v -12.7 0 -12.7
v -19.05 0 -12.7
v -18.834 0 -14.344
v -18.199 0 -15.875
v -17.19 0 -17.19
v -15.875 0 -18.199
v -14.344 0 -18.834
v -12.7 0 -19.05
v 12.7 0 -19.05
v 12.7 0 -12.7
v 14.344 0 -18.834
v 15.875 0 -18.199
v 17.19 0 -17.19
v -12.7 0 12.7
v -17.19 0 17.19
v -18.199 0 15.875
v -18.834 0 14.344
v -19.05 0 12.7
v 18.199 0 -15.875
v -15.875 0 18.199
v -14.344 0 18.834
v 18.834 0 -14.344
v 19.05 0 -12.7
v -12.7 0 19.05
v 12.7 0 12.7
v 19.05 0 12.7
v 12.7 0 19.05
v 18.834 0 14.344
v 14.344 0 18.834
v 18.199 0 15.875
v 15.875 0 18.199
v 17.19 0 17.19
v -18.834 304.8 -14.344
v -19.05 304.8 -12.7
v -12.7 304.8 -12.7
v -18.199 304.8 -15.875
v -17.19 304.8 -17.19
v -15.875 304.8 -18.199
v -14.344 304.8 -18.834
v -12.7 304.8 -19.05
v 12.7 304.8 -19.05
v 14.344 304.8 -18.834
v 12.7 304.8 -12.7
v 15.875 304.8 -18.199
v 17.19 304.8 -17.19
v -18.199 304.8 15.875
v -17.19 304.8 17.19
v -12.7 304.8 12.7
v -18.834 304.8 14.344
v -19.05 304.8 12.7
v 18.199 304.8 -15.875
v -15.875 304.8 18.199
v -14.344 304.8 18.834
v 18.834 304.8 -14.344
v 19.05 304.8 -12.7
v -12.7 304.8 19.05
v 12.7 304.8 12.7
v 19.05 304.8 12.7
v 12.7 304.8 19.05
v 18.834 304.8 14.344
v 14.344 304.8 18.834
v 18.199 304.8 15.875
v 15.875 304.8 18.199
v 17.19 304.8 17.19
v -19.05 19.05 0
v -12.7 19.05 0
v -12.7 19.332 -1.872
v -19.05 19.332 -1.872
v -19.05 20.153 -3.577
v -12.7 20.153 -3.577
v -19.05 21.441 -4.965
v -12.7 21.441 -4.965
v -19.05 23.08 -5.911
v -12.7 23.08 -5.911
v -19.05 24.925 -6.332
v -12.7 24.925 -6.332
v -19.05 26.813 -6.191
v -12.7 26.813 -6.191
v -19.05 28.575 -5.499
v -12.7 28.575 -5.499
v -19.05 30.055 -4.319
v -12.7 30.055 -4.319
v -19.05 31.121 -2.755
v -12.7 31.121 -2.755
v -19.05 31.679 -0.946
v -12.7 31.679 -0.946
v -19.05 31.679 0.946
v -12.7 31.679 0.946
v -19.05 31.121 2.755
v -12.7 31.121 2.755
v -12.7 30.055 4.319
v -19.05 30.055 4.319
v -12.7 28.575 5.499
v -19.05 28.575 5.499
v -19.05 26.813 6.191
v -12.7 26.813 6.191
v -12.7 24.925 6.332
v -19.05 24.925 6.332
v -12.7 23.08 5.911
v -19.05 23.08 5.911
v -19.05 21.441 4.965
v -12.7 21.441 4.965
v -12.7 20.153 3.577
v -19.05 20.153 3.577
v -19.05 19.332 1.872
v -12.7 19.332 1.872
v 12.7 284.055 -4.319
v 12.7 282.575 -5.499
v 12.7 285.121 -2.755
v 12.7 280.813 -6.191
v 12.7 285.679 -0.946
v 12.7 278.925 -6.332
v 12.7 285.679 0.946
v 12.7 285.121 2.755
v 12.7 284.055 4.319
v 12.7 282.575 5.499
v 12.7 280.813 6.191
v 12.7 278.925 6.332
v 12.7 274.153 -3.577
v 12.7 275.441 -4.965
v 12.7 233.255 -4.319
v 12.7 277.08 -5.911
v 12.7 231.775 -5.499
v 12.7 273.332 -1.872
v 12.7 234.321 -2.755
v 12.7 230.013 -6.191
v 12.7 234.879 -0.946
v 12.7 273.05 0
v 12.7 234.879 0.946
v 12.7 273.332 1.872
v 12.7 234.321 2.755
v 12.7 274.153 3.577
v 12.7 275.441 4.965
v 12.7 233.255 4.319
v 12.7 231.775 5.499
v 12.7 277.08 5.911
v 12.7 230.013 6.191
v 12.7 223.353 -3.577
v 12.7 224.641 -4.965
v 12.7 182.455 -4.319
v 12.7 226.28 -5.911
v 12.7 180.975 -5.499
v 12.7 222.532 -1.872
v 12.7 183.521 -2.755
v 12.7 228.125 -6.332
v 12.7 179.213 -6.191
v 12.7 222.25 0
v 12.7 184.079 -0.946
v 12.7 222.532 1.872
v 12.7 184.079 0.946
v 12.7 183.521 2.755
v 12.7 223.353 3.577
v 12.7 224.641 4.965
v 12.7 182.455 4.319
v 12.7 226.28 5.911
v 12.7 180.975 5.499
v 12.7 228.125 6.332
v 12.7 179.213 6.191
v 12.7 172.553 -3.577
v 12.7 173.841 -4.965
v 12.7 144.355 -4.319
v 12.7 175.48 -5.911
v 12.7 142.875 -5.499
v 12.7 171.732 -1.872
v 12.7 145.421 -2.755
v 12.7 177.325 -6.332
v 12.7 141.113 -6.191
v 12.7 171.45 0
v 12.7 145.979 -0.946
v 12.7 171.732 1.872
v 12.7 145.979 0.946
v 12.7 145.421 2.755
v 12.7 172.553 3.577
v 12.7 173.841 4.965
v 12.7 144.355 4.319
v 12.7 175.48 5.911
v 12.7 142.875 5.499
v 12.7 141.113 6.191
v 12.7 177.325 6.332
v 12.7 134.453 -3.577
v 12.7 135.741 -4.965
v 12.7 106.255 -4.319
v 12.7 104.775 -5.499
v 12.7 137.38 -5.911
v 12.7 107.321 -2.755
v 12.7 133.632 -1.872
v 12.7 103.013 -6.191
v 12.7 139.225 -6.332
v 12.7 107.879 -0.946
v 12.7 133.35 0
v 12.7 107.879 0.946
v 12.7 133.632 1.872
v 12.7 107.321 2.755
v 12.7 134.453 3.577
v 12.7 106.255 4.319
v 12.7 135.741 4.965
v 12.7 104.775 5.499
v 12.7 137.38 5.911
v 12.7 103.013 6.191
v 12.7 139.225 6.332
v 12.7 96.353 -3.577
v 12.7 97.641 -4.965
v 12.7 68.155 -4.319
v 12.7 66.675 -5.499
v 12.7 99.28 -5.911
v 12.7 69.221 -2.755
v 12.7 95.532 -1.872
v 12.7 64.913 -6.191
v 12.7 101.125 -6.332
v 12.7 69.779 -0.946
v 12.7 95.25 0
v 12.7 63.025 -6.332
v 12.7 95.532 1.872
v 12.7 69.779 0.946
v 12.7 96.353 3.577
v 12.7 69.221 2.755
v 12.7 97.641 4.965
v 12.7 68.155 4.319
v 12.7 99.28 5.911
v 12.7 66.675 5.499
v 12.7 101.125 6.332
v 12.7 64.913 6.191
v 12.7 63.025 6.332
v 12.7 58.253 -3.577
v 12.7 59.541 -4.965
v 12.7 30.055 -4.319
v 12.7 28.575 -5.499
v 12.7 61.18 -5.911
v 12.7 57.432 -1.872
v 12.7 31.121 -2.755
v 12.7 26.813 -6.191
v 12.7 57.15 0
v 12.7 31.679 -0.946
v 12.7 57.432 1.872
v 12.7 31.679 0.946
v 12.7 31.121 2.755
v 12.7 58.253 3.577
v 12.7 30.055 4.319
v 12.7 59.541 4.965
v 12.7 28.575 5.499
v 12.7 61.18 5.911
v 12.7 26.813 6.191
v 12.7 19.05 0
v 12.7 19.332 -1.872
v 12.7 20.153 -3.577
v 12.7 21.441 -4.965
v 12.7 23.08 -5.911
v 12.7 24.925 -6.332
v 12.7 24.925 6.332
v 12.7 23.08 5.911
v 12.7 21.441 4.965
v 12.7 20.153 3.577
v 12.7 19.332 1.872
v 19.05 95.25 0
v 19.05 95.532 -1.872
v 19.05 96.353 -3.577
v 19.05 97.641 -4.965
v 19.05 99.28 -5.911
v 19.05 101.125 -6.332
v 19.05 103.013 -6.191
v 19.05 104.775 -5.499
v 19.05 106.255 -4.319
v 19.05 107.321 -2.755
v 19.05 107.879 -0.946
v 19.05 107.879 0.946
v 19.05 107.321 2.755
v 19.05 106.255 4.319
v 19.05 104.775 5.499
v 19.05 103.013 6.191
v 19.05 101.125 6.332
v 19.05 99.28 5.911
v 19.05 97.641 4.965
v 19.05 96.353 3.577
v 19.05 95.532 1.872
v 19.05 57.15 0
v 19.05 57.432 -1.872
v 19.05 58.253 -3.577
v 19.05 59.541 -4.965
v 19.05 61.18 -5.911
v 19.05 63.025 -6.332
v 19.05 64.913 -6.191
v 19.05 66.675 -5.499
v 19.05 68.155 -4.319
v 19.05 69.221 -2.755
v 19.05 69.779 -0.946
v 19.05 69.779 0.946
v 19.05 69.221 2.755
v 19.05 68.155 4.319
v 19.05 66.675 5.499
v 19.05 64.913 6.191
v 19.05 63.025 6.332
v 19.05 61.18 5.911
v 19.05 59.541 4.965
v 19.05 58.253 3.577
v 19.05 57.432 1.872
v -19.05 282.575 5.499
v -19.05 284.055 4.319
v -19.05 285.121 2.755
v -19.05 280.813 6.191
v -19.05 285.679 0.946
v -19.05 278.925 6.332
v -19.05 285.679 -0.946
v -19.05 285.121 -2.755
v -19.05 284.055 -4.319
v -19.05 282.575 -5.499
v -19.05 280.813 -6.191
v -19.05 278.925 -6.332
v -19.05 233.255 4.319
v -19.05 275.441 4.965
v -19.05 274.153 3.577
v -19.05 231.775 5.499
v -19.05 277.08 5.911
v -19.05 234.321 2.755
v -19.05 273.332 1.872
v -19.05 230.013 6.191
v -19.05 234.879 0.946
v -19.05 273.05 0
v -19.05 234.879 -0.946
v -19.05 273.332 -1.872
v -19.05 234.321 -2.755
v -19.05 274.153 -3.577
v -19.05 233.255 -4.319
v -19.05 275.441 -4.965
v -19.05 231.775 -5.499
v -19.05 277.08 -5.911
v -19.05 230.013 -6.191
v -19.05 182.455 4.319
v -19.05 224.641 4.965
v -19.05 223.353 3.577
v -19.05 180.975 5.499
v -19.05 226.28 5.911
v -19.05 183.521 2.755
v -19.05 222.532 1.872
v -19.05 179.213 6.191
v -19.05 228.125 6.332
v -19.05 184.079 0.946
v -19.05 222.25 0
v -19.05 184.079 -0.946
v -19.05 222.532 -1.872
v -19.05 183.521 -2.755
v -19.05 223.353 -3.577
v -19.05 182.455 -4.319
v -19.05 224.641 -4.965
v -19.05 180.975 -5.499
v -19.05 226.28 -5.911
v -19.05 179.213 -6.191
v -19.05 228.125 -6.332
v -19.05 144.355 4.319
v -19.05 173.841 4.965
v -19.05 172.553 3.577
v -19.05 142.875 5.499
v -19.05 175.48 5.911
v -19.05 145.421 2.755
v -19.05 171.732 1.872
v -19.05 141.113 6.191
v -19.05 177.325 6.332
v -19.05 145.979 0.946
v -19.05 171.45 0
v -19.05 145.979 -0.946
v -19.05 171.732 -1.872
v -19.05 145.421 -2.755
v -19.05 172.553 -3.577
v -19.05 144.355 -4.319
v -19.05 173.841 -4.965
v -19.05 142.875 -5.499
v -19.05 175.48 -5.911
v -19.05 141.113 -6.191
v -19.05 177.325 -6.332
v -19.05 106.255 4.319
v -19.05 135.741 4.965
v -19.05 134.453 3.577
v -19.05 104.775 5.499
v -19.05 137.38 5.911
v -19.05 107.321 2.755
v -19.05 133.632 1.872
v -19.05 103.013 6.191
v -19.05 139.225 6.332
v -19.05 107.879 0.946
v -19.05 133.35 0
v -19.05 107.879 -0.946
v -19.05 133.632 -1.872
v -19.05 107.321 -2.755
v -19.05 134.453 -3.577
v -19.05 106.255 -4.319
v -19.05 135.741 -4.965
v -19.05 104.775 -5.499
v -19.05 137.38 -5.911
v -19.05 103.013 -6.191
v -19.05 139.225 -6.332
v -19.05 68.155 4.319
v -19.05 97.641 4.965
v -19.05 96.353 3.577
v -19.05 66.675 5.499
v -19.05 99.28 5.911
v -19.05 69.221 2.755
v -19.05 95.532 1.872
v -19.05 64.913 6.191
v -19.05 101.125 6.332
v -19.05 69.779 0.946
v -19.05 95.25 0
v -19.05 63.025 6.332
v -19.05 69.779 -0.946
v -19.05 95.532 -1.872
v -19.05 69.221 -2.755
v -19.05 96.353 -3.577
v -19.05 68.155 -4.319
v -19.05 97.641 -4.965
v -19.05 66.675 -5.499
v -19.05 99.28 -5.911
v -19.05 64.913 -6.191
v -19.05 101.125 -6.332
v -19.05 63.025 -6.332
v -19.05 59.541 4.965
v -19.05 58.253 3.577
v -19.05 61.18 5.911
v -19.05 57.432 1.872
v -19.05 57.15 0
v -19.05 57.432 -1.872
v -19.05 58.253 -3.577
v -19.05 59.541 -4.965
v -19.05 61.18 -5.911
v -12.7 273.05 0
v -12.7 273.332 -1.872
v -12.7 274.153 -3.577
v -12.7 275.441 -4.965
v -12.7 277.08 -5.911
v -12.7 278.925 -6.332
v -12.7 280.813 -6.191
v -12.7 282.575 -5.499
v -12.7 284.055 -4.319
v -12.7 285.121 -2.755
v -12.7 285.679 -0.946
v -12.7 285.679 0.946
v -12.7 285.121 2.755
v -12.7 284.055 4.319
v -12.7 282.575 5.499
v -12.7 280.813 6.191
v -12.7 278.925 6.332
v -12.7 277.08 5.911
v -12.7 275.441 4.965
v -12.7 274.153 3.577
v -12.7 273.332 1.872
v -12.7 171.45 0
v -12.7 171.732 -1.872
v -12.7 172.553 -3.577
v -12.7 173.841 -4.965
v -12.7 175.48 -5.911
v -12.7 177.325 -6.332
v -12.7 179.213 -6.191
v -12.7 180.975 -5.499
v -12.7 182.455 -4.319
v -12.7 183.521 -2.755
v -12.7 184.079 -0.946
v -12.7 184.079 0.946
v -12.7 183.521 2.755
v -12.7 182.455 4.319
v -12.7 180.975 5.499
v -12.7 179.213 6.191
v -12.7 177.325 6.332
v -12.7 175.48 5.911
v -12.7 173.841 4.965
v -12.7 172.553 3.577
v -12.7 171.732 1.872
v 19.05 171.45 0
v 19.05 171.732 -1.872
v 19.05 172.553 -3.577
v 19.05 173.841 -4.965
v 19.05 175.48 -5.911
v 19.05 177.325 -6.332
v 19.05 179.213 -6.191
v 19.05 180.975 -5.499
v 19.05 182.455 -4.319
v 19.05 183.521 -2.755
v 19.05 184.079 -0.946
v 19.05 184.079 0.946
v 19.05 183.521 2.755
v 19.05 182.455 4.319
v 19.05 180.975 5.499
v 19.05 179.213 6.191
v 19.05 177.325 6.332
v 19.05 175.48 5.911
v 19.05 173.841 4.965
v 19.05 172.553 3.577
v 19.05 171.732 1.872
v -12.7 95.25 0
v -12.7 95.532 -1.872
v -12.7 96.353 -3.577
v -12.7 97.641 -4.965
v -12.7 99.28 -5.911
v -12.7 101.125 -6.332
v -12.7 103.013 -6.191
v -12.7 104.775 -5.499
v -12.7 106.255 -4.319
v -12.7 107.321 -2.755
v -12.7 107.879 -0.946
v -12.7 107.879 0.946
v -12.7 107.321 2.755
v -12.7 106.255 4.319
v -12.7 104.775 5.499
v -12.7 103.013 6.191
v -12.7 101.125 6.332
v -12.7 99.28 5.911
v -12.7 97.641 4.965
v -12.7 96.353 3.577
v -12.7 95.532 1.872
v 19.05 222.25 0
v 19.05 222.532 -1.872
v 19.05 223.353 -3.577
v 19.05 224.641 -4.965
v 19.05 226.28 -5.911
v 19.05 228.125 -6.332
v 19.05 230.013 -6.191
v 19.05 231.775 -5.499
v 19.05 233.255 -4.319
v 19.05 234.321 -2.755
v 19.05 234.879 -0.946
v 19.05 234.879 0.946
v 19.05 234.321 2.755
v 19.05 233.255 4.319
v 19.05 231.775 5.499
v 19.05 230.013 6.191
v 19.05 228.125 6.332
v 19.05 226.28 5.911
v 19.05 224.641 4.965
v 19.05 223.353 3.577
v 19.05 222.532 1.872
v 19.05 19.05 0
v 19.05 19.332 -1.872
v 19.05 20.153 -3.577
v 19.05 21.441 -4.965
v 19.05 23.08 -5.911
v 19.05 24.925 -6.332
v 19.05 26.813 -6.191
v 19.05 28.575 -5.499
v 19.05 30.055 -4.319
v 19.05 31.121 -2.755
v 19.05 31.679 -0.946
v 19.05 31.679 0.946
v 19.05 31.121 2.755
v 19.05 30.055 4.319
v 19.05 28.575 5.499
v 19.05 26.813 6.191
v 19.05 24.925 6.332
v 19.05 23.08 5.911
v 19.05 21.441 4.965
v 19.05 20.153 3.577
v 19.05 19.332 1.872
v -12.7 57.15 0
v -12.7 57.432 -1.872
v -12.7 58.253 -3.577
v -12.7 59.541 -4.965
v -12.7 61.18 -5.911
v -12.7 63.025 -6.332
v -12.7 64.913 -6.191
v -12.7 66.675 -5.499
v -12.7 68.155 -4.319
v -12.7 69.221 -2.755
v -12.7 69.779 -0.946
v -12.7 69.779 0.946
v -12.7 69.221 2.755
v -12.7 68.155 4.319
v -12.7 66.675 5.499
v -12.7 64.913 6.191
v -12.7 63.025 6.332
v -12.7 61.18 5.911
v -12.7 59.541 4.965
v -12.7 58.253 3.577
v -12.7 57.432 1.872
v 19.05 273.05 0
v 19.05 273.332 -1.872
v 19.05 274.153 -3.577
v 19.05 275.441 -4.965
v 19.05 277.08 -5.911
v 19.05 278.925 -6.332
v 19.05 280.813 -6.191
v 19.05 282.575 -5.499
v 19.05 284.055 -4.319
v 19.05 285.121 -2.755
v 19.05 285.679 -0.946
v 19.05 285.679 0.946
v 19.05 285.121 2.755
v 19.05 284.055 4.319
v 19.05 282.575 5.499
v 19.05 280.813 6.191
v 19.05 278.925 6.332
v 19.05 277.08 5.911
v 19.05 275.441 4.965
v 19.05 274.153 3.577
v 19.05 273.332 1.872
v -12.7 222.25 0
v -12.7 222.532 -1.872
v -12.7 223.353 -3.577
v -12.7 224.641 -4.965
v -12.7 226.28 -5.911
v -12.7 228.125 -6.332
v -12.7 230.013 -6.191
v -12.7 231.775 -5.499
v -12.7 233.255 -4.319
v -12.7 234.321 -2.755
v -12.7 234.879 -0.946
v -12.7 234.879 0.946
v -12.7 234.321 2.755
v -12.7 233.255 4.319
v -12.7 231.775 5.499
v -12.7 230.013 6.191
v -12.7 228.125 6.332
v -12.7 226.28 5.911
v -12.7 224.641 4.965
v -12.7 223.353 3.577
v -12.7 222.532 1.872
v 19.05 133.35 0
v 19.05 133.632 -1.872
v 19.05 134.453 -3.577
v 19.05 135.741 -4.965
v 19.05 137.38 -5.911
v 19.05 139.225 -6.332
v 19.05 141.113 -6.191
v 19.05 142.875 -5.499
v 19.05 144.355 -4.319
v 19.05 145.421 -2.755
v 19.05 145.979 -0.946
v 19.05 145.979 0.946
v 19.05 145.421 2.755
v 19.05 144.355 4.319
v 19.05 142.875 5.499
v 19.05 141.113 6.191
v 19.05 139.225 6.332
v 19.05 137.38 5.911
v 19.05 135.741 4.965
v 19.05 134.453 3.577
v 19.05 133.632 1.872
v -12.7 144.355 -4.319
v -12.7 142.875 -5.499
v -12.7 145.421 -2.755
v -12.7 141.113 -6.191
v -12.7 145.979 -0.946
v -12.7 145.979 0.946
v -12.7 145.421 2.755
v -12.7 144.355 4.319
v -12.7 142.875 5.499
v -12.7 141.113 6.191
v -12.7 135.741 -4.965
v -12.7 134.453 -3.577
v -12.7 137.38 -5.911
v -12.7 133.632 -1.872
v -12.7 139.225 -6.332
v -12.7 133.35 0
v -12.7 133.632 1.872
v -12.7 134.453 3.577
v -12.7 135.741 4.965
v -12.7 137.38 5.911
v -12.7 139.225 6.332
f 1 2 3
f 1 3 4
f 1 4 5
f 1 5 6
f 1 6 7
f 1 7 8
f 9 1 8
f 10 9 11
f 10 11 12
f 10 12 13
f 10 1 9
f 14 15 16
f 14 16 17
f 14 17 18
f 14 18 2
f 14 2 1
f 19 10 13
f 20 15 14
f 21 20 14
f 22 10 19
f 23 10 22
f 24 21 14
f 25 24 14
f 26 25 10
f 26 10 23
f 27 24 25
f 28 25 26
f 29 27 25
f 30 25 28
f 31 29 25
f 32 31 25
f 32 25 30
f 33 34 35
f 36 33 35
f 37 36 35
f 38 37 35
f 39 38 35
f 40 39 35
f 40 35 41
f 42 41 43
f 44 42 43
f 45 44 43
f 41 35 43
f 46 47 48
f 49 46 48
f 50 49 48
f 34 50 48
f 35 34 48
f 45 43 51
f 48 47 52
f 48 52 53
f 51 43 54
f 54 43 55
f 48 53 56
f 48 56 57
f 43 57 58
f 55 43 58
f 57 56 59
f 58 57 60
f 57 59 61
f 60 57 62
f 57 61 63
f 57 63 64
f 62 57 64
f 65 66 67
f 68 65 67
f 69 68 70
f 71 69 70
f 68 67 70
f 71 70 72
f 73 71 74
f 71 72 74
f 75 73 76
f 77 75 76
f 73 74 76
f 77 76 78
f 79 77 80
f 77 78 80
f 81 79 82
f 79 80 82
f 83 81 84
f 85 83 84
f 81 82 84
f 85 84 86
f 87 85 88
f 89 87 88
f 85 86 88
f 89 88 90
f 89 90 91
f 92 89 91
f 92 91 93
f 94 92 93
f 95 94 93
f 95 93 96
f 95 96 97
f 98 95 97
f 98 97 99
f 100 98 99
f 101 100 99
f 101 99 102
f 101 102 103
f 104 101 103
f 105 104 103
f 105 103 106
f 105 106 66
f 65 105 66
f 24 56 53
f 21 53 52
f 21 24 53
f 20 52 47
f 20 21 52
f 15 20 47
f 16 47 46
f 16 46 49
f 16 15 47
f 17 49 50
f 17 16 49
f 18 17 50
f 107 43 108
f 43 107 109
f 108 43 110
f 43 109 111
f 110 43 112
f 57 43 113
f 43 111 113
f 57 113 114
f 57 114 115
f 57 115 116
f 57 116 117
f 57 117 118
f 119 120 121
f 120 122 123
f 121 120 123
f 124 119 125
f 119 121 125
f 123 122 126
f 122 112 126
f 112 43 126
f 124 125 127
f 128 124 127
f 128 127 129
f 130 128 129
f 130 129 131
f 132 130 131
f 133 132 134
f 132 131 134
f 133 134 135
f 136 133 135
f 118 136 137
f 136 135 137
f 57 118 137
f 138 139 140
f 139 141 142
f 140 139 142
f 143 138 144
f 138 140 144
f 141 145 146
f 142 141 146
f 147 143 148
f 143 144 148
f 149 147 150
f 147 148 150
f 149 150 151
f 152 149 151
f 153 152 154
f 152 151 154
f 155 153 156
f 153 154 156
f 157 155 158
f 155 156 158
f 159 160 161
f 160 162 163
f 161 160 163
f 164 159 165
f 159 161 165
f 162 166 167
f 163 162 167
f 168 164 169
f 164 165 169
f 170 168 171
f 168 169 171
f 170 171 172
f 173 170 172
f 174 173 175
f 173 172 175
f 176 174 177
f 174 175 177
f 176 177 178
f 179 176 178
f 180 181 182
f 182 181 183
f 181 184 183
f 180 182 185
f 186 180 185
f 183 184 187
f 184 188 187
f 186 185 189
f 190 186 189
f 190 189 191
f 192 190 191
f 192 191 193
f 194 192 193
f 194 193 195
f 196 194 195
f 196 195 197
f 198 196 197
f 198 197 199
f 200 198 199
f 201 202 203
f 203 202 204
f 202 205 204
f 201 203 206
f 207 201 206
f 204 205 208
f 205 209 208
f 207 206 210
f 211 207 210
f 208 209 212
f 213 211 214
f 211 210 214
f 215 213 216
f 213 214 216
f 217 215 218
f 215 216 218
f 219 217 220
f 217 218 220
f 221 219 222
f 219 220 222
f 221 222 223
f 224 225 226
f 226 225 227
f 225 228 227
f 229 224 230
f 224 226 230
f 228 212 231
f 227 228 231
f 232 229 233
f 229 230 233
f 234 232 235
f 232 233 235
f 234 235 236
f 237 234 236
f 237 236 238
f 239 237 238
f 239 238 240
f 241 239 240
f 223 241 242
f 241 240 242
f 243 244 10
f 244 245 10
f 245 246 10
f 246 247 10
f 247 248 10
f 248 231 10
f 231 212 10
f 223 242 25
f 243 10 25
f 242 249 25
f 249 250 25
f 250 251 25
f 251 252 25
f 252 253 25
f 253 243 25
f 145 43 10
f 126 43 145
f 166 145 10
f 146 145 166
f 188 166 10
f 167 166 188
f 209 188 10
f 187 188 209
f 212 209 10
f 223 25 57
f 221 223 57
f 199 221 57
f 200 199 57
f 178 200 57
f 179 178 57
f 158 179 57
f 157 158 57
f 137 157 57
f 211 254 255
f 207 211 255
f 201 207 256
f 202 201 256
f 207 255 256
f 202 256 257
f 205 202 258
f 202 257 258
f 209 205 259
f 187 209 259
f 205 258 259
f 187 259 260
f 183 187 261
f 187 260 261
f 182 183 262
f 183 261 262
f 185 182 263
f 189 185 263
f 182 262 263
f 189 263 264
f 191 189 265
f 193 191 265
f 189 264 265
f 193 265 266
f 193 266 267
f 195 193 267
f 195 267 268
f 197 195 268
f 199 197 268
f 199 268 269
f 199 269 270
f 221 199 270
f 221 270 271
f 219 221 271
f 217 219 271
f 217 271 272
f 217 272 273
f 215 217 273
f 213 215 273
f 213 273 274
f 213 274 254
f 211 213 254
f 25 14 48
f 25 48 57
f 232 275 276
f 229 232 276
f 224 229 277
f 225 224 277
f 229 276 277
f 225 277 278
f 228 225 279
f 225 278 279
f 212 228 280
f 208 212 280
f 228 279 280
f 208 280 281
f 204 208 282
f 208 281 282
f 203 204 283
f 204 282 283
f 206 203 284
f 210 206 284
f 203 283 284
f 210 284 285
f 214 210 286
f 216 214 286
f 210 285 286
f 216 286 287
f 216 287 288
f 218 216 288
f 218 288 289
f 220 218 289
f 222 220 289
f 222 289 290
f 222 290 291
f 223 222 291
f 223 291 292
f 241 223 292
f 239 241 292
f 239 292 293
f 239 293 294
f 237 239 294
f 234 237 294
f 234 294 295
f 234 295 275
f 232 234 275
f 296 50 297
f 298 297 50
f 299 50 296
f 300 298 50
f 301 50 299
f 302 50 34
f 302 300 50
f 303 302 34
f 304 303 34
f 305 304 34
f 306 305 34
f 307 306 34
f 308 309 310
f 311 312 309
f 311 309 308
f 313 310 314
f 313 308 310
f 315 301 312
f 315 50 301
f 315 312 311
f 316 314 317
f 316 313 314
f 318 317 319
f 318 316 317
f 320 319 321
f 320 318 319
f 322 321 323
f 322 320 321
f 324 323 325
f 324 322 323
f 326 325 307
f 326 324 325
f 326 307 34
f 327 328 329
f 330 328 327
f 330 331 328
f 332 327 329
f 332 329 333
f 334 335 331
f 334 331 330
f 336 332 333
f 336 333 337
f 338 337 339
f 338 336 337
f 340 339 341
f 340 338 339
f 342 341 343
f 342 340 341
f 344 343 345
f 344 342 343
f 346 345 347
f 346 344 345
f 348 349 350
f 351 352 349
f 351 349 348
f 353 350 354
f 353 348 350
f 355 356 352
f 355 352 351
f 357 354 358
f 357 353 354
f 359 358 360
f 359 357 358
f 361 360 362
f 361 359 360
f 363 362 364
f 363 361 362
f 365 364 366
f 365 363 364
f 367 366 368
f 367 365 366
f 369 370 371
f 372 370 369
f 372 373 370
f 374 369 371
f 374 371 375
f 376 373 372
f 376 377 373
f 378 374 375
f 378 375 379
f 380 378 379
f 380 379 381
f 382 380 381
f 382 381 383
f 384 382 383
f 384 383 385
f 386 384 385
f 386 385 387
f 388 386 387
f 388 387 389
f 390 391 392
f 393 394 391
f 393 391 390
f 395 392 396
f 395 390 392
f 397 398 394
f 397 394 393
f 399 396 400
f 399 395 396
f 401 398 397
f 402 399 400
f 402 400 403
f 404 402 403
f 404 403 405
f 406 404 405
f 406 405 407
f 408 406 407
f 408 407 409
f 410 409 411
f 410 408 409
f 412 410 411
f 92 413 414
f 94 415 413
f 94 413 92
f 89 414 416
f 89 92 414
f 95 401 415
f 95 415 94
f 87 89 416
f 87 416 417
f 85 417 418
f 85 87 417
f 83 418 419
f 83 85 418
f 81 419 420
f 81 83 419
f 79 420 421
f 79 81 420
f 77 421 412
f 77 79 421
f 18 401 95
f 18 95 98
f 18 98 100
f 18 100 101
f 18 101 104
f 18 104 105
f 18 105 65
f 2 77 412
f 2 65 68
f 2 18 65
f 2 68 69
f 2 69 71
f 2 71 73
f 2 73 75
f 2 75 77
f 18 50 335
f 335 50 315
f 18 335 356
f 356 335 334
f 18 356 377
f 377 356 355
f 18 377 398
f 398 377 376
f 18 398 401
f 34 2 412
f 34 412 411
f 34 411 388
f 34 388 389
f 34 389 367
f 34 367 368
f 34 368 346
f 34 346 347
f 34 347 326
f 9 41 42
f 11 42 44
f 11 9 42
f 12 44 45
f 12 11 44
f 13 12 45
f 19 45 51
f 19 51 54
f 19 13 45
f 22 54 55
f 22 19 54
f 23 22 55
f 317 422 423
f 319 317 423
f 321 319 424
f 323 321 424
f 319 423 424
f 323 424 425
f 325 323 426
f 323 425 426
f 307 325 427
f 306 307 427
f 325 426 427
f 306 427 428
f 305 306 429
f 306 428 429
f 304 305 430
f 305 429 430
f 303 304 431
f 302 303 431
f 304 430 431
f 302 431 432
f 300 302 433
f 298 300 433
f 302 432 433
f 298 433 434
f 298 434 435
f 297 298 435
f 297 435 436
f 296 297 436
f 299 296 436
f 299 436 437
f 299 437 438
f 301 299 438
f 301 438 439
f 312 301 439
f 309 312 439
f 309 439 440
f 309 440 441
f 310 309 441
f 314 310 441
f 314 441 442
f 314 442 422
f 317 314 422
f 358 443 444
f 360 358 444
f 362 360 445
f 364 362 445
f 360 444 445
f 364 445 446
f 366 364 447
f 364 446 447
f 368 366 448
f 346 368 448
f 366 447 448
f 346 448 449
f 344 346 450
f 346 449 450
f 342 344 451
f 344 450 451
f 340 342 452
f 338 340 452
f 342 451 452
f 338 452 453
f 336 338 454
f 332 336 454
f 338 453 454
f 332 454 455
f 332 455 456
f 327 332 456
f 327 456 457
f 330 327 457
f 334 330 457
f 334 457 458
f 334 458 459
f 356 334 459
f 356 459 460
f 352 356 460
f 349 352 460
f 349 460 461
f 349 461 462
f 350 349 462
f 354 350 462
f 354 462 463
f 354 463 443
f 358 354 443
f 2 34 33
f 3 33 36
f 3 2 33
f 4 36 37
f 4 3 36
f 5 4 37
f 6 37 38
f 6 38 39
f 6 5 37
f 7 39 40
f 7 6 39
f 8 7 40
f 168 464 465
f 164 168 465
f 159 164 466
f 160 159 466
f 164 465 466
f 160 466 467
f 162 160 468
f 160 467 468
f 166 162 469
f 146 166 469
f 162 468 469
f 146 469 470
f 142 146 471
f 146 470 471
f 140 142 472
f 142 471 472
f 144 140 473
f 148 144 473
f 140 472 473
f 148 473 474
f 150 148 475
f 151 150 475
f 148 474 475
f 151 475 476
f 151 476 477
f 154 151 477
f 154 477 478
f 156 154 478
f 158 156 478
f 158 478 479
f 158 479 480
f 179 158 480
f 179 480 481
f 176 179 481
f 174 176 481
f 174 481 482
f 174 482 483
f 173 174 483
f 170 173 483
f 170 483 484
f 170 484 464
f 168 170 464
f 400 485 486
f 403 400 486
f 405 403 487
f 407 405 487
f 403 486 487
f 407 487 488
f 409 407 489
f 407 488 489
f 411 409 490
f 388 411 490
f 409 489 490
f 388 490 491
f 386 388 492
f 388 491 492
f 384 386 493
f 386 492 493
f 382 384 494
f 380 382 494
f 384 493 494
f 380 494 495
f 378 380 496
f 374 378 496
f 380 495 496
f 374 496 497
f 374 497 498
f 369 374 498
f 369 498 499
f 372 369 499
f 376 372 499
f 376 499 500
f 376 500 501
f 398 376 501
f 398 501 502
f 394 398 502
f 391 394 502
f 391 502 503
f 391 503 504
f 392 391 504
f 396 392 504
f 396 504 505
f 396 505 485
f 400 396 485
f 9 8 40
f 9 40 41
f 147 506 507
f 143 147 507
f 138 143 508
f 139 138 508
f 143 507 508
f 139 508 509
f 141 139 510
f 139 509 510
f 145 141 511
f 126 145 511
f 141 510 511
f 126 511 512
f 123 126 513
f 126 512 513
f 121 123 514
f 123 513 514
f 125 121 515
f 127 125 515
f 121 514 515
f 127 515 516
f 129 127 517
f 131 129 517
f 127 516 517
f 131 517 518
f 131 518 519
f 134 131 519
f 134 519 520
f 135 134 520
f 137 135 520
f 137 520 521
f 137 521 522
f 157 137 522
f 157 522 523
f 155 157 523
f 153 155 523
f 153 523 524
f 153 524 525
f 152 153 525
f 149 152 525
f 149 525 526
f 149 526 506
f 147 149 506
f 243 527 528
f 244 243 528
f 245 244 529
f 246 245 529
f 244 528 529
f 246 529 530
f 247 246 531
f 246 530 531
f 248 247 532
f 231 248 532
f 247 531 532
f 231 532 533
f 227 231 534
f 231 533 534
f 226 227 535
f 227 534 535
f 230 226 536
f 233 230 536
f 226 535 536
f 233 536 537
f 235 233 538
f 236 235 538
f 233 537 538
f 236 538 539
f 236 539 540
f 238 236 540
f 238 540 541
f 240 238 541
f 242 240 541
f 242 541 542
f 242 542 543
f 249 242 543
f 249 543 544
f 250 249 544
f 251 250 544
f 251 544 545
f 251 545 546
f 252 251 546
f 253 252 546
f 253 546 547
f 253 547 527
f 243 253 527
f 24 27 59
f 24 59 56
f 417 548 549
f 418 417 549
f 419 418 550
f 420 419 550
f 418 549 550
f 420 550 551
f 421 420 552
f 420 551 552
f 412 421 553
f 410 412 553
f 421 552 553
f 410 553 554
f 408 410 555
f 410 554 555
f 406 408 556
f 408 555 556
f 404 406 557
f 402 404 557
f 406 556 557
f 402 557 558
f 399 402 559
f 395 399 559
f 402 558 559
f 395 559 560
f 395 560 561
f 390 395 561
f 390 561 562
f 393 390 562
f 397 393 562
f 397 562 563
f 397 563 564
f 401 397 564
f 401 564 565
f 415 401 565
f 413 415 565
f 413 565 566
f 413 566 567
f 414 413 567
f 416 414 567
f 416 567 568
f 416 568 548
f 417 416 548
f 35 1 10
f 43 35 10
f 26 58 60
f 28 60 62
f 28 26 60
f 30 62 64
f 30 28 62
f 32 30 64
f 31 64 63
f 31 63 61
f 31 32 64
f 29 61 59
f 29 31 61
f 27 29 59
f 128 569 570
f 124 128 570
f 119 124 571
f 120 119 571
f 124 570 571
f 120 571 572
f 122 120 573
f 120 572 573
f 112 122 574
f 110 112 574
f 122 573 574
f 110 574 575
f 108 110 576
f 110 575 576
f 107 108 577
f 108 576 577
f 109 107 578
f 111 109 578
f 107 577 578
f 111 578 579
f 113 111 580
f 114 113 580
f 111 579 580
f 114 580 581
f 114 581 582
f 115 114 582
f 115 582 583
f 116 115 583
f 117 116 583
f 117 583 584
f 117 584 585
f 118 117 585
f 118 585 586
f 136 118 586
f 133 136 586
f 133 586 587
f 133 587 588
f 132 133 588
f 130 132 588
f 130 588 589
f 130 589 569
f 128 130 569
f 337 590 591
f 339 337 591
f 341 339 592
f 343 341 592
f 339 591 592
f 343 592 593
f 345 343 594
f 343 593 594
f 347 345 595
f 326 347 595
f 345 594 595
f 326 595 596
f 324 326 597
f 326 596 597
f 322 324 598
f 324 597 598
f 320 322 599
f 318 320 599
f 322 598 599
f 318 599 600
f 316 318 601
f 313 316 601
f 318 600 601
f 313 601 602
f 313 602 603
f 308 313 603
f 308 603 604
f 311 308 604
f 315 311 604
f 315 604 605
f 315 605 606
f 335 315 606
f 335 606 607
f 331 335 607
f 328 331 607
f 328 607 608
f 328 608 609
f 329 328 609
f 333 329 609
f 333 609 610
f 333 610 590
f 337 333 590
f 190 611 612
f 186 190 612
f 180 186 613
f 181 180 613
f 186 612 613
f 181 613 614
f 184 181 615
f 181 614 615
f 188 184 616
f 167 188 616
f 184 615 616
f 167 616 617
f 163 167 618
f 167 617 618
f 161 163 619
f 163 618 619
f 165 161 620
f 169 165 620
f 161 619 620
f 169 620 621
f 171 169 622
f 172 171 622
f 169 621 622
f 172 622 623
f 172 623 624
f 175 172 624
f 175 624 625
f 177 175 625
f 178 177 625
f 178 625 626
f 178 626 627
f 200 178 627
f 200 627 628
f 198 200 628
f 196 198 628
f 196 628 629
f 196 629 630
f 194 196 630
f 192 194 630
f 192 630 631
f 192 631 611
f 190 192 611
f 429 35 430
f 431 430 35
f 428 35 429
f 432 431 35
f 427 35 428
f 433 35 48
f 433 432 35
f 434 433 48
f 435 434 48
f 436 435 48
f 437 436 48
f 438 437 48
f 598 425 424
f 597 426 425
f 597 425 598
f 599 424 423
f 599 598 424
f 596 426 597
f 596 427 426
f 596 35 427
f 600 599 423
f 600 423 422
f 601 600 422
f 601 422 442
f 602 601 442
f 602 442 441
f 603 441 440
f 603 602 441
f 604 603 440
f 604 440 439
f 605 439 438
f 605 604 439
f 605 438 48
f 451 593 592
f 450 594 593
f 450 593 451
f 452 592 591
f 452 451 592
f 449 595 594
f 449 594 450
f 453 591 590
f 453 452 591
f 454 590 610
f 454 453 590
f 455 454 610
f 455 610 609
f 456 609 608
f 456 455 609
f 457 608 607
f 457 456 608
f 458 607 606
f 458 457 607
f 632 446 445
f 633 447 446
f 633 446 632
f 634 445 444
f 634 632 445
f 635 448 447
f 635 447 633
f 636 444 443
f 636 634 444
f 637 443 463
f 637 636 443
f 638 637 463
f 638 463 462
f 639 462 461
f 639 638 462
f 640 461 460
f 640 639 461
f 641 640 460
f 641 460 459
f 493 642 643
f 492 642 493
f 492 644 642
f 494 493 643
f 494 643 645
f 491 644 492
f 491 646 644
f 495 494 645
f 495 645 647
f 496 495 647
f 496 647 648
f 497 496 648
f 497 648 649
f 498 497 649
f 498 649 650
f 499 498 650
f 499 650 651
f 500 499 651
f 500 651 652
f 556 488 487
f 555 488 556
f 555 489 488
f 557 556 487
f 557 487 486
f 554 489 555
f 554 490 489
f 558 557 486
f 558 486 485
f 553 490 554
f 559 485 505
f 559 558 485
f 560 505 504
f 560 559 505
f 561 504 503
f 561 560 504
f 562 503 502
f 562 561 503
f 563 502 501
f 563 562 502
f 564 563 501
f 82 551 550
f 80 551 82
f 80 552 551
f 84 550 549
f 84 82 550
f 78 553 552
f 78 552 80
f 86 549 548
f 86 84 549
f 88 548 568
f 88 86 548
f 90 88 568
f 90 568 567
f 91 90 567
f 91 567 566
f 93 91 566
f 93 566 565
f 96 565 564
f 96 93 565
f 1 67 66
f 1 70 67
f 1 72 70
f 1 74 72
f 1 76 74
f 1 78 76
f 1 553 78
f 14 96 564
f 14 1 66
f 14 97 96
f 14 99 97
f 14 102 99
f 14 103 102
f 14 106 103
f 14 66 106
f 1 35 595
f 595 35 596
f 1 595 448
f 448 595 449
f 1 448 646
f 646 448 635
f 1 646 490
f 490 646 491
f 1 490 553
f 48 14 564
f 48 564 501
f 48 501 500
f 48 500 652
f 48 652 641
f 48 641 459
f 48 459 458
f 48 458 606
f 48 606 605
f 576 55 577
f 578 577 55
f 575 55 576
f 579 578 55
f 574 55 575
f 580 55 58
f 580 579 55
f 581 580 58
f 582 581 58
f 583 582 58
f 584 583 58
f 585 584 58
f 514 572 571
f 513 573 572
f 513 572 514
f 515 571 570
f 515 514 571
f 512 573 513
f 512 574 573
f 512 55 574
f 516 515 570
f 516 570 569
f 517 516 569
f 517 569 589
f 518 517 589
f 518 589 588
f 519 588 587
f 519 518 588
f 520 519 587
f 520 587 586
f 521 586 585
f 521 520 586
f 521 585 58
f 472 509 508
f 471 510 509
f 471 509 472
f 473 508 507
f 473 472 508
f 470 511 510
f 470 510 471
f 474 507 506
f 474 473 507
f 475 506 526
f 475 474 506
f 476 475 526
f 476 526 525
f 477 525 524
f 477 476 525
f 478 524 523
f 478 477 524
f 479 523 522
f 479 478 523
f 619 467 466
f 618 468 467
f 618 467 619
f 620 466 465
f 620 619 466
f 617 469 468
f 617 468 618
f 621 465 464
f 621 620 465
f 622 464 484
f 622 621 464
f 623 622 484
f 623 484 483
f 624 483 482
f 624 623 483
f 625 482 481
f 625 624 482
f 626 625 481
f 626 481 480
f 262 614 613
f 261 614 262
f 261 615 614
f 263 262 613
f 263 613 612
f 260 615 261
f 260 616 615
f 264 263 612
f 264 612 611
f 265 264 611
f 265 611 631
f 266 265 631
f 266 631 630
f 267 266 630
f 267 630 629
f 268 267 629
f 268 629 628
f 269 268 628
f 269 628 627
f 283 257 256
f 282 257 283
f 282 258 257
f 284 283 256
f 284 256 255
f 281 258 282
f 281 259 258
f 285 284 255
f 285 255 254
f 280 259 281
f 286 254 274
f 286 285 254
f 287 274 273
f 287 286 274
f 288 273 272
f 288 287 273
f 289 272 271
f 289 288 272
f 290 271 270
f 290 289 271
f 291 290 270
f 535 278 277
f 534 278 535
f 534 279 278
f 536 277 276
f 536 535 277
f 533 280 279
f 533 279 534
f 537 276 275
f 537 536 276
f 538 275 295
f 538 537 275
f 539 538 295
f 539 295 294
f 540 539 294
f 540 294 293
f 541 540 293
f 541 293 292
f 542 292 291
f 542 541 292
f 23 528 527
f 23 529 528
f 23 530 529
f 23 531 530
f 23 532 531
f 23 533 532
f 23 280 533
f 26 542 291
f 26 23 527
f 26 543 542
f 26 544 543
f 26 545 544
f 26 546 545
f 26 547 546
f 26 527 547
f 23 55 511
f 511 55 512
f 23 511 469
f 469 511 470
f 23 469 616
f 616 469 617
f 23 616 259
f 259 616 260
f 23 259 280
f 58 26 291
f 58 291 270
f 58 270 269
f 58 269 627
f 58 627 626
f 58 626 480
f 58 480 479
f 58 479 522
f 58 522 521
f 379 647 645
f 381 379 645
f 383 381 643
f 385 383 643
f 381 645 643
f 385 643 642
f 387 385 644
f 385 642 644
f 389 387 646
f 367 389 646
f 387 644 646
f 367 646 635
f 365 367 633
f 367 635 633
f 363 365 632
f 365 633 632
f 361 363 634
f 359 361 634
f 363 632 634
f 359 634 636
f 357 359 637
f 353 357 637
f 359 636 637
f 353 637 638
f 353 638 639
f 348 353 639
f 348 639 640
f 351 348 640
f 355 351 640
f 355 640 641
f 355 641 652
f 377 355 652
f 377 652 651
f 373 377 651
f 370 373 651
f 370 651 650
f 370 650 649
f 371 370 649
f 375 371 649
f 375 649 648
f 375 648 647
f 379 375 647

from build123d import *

# Parameters (mm, degrees)
F0_W     = 25.4
F0_H     = 25.4
F2_DEPTH = 304.8
F4_D     = 12.7
F1_D     = 12.7


with BuildPart() as f2:
    # F0 (on Front) → F2 (new body)
    with BuildSketch(Plane.XZ):
        with BuildLine():
            Line((-12.7, -19.05), (12.7, -19.05))
            ThreePointArc((12.7, -19.05), (17.190128, -17.190128), (19.05, -12.7))
            Line((19.05, -12.7), (19.05, 12.7))
            ThreePointArc((19.05, 12.7), (17.190128, 17.190128), (12.7, 19.05))
            Line((12.7, 19.05), (-12.7, 19.05))
            ThreePointArc((-12.7, 19.05), (-17.190128, 17.190128), (-19.05, 12.7))
            Line((-19.05, 12.7), (-19.05, -12.7))
            ThreePointArc((-19.05, -12.7), (-17.190128, -17.190128), (-12.7, -19.05))
        make_face()
        Rectangle(F0_W, F0_H, mode=Mode.SUBTRACT)
    extrude(amount=-F2_DEPTH)

    # F4 (through all)
    with Locations(Plane(origin=(0, 0, 0), x_dir=(0, 1, 0), z_dir=(-1, 0, 0))):
        with Locations((25.4, 0), (101.6, 0), (63.5, 0), (228.6, 0), (279.4, 0), (139.7, 0), (177.8, 0)):
            Hole(F4_D / 2)

    # F1 (through all)
    with Locations(Plane.YZ):
        with Locations((25.4, 0), (63.5, 0), (101.6, 0), (228.6, 0), (279.4, 0), (139.7, 0), (177.8, 0)):
            Hole(F1_D / 2)


solid = f2.part
